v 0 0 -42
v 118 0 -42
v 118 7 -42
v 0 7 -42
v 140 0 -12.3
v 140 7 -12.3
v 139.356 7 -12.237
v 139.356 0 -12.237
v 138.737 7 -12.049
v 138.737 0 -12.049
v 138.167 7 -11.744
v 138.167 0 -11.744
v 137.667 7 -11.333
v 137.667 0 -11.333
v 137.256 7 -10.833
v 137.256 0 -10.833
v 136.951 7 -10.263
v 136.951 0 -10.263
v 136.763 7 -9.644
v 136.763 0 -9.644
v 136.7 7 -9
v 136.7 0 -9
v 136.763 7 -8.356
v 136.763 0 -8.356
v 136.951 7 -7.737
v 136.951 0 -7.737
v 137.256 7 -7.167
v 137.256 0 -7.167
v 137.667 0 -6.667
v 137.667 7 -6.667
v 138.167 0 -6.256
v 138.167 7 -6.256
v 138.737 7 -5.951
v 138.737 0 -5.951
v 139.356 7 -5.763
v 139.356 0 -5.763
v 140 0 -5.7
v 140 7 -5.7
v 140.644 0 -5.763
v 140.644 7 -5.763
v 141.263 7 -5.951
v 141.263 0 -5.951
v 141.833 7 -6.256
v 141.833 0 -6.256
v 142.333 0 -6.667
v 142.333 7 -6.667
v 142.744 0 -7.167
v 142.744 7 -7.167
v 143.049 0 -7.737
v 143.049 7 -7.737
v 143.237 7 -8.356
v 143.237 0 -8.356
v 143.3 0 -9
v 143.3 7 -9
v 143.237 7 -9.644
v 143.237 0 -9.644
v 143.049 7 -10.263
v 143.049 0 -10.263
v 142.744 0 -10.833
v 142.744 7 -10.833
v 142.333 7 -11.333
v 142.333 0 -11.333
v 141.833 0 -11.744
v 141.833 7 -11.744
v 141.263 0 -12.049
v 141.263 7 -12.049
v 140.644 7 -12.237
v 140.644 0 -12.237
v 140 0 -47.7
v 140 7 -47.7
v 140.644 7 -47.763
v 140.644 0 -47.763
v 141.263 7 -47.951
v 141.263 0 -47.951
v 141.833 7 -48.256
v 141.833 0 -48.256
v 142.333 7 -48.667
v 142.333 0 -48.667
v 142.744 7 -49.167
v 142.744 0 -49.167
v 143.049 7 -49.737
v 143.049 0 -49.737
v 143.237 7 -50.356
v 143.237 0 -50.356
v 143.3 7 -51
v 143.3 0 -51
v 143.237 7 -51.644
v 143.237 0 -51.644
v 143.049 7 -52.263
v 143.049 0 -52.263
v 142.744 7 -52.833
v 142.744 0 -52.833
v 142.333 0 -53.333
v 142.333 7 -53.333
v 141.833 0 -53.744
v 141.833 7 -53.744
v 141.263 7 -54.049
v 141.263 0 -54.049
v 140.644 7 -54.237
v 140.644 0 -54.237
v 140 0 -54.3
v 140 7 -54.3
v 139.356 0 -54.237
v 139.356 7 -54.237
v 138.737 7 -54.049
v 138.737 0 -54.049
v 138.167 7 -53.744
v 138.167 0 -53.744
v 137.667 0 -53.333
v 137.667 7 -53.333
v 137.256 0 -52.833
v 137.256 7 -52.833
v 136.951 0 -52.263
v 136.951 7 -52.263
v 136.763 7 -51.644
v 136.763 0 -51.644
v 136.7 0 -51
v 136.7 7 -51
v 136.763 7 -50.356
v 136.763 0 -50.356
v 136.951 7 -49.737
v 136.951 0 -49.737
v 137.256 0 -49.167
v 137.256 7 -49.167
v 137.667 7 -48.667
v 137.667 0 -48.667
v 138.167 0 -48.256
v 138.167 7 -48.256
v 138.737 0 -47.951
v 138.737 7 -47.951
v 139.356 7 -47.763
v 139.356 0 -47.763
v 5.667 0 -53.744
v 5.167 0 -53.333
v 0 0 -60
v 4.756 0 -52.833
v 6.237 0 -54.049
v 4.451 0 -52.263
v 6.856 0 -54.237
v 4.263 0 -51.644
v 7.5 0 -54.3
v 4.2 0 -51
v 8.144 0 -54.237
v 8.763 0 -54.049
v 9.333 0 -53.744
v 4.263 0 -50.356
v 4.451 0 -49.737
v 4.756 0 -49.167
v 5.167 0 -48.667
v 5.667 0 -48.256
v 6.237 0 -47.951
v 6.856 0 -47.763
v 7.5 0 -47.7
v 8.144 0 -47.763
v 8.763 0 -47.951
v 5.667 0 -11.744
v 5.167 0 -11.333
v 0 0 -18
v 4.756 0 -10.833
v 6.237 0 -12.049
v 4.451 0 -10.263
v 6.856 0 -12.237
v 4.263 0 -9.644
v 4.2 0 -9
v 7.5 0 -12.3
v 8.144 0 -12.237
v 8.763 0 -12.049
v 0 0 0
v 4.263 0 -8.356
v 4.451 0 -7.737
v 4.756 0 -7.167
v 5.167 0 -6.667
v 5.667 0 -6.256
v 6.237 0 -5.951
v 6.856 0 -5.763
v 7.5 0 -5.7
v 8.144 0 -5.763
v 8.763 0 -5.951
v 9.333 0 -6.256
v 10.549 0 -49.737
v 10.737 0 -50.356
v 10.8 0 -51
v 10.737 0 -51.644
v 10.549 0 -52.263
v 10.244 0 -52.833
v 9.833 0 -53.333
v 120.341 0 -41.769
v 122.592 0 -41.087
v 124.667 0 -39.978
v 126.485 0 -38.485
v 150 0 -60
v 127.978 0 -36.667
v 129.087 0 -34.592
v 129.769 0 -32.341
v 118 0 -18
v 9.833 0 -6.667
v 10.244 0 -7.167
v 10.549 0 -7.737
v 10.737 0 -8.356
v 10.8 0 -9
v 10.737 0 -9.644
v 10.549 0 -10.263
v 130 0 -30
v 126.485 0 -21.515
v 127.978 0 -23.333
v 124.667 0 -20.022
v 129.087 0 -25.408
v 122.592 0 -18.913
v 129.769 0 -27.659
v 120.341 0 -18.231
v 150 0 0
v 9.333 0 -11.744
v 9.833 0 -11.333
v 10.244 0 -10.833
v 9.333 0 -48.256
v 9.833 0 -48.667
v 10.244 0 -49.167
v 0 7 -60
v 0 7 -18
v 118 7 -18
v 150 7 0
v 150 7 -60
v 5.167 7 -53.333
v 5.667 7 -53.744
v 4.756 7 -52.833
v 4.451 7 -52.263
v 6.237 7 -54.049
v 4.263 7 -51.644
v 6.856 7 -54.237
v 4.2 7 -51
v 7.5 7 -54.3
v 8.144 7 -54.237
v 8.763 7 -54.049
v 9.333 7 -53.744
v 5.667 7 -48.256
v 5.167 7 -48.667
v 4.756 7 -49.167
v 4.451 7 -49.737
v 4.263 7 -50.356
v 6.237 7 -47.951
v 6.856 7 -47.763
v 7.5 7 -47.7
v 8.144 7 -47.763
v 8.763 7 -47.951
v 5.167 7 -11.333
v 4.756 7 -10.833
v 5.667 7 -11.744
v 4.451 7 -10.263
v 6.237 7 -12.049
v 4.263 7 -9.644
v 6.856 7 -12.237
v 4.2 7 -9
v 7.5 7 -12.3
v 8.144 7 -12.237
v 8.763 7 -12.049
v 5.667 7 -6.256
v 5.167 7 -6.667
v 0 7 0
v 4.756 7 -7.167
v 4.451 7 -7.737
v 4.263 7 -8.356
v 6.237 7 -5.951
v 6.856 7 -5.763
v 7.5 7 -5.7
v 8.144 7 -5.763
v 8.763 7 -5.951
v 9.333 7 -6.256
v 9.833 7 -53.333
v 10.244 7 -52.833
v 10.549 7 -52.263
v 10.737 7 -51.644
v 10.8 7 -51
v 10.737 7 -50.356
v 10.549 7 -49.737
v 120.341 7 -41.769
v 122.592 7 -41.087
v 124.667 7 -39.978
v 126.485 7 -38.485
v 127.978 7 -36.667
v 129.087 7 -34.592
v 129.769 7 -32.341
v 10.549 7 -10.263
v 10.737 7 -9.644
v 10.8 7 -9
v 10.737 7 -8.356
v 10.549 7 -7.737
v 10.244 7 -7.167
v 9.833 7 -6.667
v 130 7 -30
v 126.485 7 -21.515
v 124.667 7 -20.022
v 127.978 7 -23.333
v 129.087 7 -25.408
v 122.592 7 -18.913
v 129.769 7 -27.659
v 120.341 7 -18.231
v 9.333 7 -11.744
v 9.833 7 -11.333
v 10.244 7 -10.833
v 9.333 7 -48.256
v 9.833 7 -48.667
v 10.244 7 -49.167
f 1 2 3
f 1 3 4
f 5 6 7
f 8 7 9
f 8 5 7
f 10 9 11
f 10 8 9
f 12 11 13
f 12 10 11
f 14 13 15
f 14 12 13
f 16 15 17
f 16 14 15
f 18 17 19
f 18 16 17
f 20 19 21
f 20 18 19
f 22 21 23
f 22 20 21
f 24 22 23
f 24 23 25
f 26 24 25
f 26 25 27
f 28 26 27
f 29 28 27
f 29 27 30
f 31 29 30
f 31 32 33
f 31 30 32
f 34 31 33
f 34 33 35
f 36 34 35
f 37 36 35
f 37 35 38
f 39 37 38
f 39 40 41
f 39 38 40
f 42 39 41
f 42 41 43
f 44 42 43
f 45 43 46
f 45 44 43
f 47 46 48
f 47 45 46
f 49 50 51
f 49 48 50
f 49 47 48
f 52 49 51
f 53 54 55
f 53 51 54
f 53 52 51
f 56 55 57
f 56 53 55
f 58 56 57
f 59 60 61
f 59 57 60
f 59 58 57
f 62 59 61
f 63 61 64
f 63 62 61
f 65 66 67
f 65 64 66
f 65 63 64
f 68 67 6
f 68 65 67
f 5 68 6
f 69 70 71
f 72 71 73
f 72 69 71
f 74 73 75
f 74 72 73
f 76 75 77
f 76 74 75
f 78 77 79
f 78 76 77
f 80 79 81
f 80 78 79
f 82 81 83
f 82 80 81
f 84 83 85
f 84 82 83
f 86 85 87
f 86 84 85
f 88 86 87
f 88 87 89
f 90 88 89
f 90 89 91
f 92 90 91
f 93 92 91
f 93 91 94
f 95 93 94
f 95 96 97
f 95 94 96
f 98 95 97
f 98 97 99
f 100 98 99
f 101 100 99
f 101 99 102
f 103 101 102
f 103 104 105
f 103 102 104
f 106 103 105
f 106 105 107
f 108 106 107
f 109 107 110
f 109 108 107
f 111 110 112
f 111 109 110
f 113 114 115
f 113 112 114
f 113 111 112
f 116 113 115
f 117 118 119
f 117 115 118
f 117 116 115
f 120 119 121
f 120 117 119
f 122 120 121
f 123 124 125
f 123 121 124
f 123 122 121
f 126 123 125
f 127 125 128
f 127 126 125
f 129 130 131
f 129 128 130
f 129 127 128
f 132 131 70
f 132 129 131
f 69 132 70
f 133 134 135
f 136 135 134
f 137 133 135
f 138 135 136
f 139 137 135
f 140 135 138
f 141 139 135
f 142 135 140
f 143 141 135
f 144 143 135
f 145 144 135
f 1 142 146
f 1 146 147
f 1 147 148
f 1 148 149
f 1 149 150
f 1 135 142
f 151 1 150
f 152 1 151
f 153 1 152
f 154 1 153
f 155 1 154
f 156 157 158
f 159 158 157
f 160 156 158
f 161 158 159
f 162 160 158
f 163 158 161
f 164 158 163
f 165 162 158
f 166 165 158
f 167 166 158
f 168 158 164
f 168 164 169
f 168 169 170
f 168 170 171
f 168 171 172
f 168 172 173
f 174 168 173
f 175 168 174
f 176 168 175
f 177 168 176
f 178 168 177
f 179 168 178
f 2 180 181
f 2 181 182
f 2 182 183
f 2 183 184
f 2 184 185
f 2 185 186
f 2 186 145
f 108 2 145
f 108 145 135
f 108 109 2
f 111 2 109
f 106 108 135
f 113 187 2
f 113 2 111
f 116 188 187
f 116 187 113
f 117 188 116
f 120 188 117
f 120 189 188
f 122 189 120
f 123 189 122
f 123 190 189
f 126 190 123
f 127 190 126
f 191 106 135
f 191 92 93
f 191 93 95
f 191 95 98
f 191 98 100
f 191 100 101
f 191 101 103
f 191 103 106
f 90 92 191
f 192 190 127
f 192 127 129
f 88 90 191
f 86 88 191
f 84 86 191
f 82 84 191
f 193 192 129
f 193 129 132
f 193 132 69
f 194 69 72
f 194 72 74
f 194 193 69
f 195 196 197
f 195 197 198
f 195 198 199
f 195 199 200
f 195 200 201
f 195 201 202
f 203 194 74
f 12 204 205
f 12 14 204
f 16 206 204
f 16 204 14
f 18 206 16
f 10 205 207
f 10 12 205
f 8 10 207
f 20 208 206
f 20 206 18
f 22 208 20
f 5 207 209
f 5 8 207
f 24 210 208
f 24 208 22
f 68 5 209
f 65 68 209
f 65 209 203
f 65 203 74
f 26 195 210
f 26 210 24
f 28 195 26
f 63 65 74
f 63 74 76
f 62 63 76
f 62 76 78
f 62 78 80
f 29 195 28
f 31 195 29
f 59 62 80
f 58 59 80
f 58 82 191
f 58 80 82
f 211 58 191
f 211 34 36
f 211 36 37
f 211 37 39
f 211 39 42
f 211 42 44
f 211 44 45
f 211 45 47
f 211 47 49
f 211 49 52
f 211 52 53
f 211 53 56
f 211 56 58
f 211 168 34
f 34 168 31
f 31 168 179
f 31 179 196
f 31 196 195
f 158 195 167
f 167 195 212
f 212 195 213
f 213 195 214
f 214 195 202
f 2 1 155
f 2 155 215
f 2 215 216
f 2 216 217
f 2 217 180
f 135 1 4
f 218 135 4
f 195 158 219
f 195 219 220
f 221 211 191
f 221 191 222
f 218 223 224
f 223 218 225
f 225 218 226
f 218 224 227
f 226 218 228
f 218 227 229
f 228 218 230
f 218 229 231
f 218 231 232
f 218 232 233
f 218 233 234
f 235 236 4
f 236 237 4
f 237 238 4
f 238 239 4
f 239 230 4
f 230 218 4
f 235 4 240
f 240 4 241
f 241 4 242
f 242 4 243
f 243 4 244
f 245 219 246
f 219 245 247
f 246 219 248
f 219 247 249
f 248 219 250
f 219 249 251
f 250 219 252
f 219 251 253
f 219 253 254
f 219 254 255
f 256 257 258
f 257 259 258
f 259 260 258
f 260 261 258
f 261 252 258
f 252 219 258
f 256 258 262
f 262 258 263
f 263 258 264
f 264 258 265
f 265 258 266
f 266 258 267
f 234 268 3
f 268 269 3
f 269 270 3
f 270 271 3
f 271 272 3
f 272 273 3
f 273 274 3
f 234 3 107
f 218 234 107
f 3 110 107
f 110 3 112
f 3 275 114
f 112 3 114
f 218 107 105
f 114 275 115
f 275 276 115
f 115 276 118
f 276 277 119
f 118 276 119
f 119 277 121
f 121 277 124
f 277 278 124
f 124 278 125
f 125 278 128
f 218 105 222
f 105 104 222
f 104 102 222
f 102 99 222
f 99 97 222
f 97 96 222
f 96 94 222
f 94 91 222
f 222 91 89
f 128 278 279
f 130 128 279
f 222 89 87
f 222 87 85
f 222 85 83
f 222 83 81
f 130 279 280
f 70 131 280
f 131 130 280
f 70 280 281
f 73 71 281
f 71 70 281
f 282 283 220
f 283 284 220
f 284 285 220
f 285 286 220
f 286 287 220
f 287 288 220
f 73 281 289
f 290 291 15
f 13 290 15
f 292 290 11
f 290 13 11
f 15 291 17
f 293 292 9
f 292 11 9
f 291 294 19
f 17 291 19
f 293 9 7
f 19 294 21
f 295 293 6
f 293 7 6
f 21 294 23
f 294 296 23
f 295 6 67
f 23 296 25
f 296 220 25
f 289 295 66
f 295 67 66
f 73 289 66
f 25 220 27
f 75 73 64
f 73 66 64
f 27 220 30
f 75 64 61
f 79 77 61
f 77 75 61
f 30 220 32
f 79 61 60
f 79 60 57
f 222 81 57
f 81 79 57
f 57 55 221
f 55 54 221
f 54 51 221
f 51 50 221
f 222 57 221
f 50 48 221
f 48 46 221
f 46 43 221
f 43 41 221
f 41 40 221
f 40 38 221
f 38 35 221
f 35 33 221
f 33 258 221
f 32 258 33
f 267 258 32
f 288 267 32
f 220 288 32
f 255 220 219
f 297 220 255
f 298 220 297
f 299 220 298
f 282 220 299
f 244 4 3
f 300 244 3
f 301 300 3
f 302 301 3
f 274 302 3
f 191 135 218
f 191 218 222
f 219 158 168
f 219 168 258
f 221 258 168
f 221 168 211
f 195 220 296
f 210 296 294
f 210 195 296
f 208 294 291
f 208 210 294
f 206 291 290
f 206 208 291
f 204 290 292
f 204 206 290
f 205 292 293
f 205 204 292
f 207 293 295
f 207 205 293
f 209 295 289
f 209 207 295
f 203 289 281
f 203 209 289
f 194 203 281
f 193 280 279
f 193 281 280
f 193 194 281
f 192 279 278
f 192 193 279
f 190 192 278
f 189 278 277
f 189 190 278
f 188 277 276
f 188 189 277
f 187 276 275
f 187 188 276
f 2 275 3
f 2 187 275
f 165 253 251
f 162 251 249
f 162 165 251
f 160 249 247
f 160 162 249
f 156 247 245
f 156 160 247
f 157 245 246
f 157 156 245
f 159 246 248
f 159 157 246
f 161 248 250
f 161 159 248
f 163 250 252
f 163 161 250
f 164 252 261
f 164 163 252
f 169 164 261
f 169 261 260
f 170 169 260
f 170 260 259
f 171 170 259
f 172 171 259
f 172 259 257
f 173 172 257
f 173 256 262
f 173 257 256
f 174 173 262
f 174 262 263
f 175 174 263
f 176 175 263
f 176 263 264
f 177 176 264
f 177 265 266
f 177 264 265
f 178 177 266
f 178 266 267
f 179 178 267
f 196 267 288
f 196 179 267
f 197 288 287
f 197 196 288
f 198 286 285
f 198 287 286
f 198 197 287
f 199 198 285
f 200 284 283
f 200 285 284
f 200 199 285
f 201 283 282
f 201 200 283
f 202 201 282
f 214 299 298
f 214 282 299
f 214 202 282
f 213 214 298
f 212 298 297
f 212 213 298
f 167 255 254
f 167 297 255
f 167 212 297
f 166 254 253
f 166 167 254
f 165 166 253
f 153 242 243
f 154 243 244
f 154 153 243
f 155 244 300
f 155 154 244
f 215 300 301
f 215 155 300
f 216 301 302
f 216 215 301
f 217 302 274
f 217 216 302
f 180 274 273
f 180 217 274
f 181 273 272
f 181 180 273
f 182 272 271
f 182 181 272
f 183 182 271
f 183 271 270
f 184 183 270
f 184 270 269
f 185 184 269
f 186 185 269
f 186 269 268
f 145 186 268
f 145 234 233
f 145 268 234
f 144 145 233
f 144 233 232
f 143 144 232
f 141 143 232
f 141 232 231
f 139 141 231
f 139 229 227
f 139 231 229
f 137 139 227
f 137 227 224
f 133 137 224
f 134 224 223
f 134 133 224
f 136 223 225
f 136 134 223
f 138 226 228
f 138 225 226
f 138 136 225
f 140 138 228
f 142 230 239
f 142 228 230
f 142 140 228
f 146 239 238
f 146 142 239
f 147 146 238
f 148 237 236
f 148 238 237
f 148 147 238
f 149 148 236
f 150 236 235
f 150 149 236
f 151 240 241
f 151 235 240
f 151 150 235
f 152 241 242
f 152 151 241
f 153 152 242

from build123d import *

# Parameters (mm, degrees)
SCHIZZO1_W                   = 150
SCHIZZO1_H                   = 7
ESTRUSIONE_ESTRUSIONE1_DEPTH = 80
SCHIZZO2_W                   = 203.570811829
SCHIZZO2_H                   = 138.674141949
SCHIZZO2_R                   = 3.3
TAGLIO_ESTRUSIONE1_DEPTH     = 171.144056611


with BuildPart() as part:
    # Schizzo1 → Estrusione-Estrusione1 (new body)
    with BuildSketch(Plane.XY):
        with Locations((75, 3.5)):
            Rectangle(SCHIZZO1_W, SCHIZZO1_H)
    extrude(amount=-ESTRUSIONE_ESTRUSIONE1_DEPTH)

    # Schizzo2 → Taglio-Estrusione1 (cut, through all)
    # profile 1 of 5: a face of its own
    with BuildSketch(Plane(origin=(0, 0, 0), x_dir=(1, 0, 0), z_dir=(0, 1, 0))):
        with Locations((73.083648688, 28.492060902)):
            Rectangle(SCHIZZO2_W, SCHIZZO2_H)
        with BuildLine():
            Line((0, 18), (118, 18))
            ThreePointArc((118, 18), (130, 30), (118, 42))
            Line((118, 42), (0, 42))
            Line((0, 42), (0, 60))
            Line((0, 60), (150, 60))
            Line((150, 60), (150, 0))
            Line((150, 0), (0, 0))
            Line((0, 0), (0, 18))
        make_face(mode=Mode.SUBTRACT)
    # profile 2 of 5: a face of its own
    with BuildSketch(Plane(origin=(0, 0, 0), x_dir=(1, 0, 0), z_dir=(0, 1, 0))):
        with Locations(Location((140, 9, 0), (0, 0, 90))):
            Circle(SCHIZZO2_R)
    # profile 3 of 5: a face of its own
    with BuildSketch(Plane(origin=(0, 0, 0), x_dir=(1, 0, 0), z_dir=(0, 1, 0))):
        with Locations(Location((140, 51, 0), (0, 0, 270))):
            Circle(SCHIZZO2_R)
    # profile 4 of 5: a face of its own
    with BuildSketch(Plane(origin=(0, 0, 0), x_dir=(1, 0, 0), z_dir=(0, 1, 0))):
        with Locations(Location((7.5, 9, 0), (0, 0, 90))):
            Circle(SCHIZZO2_R)
    # profile 5 of 5: a face of its own
    with BuildSketch(Plane(origin=(0, 0, 0), x_dir=(1, 0, 0), z_dir=(0, 1, 0))):
        with Locations(Location((7.5, 51, 0), (0, 0, 270))):
            Circle(SCHIZZO2_R)
    extrude(amount=TAGLIO_ESTRUSIONE1_DEPTH, mode=Mode.SUBTRACT)


solid = part.part
